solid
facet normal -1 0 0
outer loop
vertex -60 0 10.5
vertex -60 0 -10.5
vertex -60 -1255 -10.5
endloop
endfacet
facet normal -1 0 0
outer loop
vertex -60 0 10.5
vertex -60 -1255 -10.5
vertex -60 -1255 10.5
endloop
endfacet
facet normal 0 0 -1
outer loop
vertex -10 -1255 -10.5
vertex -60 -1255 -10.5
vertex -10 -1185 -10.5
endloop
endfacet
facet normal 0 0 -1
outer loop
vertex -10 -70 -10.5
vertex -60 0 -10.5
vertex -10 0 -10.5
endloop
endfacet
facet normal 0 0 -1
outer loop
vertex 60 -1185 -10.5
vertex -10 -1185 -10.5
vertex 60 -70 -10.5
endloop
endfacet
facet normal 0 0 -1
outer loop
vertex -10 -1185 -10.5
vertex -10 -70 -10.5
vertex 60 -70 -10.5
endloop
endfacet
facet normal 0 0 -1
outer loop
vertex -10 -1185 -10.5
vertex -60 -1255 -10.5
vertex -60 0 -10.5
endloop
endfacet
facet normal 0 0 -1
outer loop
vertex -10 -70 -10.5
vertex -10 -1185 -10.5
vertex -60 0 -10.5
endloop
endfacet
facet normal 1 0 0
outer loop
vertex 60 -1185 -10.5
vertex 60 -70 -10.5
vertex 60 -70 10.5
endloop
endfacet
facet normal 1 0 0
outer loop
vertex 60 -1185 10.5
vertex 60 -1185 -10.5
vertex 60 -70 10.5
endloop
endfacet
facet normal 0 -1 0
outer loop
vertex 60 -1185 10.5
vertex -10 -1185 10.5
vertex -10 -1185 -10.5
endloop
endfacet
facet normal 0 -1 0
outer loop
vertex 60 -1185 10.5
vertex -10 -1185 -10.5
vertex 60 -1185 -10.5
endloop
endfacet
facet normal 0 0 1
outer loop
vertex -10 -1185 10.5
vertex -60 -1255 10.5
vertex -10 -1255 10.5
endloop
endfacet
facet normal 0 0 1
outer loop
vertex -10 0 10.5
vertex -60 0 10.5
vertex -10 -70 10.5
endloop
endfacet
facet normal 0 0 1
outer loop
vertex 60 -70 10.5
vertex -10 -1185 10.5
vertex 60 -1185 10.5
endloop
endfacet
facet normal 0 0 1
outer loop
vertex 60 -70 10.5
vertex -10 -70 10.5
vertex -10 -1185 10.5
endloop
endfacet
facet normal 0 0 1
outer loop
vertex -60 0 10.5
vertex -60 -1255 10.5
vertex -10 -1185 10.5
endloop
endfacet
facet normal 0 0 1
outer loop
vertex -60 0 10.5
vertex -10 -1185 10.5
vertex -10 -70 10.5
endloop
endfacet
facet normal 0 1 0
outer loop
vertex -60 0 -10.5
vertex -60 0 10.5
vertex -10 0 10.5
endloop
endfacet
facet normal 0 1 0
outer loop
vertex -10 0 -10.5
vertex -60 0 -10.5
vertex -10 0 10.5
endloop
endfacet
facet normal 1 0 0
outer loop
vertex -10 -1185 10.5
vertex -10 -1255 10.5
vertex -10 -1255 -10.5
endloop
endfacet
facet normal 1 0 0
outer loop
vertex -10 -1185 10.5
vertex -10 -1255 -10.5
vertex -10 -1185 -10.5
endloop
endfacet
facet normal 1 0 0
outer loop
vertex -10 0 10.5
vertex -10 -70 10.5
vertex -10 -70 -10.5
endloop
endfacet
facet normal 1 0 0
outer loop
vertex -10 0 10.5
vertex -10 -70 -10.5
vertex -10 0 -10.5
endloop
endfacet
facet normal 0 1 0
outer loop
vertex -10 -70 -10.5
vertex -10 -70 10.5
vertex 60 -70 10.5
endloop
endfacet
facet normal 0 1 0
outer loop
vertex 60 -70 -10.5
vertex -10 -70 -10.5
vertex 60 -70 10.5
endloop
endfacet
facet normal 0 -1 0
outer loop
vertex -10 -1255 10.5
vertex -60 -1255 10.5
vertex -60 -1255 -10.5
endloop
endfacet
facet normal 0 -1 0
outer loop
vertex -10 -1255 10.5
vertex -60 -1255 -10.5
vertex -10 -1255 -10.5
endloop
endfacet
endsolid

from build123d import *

# Parameters (mm, degrees)
F0_W     = 120
F0_H     = 21
F1_DEPTH = 1255
F2_W     = 70
F2_H     = 70
F3_DEPTH = 25


with BuildPart() as f1:
    # F0 (on Front) → F1 (new body)
    with BuildSketch(Plane.XZ):
        Rectangle(F0_W, F0_H)
    extrude(amount=F1_DEPTH)

    # F2 (on face) → F3 (cut)
    with BuildSketch(Plane.XY.offset(10.5)):
        with Locations((25, -1220)):
            Rectangle(F2_W, F2_H)
        with Locations((25, -35)):
            Rectangle(F2_W, F2_H)
    extrude(amount=-F3_DEPTH, mode=Mode.SUBTRACT)


with BuildPart() as f4_1:
    # F4: copy of F1
    add(f1.part)


solid = f4_1.part
